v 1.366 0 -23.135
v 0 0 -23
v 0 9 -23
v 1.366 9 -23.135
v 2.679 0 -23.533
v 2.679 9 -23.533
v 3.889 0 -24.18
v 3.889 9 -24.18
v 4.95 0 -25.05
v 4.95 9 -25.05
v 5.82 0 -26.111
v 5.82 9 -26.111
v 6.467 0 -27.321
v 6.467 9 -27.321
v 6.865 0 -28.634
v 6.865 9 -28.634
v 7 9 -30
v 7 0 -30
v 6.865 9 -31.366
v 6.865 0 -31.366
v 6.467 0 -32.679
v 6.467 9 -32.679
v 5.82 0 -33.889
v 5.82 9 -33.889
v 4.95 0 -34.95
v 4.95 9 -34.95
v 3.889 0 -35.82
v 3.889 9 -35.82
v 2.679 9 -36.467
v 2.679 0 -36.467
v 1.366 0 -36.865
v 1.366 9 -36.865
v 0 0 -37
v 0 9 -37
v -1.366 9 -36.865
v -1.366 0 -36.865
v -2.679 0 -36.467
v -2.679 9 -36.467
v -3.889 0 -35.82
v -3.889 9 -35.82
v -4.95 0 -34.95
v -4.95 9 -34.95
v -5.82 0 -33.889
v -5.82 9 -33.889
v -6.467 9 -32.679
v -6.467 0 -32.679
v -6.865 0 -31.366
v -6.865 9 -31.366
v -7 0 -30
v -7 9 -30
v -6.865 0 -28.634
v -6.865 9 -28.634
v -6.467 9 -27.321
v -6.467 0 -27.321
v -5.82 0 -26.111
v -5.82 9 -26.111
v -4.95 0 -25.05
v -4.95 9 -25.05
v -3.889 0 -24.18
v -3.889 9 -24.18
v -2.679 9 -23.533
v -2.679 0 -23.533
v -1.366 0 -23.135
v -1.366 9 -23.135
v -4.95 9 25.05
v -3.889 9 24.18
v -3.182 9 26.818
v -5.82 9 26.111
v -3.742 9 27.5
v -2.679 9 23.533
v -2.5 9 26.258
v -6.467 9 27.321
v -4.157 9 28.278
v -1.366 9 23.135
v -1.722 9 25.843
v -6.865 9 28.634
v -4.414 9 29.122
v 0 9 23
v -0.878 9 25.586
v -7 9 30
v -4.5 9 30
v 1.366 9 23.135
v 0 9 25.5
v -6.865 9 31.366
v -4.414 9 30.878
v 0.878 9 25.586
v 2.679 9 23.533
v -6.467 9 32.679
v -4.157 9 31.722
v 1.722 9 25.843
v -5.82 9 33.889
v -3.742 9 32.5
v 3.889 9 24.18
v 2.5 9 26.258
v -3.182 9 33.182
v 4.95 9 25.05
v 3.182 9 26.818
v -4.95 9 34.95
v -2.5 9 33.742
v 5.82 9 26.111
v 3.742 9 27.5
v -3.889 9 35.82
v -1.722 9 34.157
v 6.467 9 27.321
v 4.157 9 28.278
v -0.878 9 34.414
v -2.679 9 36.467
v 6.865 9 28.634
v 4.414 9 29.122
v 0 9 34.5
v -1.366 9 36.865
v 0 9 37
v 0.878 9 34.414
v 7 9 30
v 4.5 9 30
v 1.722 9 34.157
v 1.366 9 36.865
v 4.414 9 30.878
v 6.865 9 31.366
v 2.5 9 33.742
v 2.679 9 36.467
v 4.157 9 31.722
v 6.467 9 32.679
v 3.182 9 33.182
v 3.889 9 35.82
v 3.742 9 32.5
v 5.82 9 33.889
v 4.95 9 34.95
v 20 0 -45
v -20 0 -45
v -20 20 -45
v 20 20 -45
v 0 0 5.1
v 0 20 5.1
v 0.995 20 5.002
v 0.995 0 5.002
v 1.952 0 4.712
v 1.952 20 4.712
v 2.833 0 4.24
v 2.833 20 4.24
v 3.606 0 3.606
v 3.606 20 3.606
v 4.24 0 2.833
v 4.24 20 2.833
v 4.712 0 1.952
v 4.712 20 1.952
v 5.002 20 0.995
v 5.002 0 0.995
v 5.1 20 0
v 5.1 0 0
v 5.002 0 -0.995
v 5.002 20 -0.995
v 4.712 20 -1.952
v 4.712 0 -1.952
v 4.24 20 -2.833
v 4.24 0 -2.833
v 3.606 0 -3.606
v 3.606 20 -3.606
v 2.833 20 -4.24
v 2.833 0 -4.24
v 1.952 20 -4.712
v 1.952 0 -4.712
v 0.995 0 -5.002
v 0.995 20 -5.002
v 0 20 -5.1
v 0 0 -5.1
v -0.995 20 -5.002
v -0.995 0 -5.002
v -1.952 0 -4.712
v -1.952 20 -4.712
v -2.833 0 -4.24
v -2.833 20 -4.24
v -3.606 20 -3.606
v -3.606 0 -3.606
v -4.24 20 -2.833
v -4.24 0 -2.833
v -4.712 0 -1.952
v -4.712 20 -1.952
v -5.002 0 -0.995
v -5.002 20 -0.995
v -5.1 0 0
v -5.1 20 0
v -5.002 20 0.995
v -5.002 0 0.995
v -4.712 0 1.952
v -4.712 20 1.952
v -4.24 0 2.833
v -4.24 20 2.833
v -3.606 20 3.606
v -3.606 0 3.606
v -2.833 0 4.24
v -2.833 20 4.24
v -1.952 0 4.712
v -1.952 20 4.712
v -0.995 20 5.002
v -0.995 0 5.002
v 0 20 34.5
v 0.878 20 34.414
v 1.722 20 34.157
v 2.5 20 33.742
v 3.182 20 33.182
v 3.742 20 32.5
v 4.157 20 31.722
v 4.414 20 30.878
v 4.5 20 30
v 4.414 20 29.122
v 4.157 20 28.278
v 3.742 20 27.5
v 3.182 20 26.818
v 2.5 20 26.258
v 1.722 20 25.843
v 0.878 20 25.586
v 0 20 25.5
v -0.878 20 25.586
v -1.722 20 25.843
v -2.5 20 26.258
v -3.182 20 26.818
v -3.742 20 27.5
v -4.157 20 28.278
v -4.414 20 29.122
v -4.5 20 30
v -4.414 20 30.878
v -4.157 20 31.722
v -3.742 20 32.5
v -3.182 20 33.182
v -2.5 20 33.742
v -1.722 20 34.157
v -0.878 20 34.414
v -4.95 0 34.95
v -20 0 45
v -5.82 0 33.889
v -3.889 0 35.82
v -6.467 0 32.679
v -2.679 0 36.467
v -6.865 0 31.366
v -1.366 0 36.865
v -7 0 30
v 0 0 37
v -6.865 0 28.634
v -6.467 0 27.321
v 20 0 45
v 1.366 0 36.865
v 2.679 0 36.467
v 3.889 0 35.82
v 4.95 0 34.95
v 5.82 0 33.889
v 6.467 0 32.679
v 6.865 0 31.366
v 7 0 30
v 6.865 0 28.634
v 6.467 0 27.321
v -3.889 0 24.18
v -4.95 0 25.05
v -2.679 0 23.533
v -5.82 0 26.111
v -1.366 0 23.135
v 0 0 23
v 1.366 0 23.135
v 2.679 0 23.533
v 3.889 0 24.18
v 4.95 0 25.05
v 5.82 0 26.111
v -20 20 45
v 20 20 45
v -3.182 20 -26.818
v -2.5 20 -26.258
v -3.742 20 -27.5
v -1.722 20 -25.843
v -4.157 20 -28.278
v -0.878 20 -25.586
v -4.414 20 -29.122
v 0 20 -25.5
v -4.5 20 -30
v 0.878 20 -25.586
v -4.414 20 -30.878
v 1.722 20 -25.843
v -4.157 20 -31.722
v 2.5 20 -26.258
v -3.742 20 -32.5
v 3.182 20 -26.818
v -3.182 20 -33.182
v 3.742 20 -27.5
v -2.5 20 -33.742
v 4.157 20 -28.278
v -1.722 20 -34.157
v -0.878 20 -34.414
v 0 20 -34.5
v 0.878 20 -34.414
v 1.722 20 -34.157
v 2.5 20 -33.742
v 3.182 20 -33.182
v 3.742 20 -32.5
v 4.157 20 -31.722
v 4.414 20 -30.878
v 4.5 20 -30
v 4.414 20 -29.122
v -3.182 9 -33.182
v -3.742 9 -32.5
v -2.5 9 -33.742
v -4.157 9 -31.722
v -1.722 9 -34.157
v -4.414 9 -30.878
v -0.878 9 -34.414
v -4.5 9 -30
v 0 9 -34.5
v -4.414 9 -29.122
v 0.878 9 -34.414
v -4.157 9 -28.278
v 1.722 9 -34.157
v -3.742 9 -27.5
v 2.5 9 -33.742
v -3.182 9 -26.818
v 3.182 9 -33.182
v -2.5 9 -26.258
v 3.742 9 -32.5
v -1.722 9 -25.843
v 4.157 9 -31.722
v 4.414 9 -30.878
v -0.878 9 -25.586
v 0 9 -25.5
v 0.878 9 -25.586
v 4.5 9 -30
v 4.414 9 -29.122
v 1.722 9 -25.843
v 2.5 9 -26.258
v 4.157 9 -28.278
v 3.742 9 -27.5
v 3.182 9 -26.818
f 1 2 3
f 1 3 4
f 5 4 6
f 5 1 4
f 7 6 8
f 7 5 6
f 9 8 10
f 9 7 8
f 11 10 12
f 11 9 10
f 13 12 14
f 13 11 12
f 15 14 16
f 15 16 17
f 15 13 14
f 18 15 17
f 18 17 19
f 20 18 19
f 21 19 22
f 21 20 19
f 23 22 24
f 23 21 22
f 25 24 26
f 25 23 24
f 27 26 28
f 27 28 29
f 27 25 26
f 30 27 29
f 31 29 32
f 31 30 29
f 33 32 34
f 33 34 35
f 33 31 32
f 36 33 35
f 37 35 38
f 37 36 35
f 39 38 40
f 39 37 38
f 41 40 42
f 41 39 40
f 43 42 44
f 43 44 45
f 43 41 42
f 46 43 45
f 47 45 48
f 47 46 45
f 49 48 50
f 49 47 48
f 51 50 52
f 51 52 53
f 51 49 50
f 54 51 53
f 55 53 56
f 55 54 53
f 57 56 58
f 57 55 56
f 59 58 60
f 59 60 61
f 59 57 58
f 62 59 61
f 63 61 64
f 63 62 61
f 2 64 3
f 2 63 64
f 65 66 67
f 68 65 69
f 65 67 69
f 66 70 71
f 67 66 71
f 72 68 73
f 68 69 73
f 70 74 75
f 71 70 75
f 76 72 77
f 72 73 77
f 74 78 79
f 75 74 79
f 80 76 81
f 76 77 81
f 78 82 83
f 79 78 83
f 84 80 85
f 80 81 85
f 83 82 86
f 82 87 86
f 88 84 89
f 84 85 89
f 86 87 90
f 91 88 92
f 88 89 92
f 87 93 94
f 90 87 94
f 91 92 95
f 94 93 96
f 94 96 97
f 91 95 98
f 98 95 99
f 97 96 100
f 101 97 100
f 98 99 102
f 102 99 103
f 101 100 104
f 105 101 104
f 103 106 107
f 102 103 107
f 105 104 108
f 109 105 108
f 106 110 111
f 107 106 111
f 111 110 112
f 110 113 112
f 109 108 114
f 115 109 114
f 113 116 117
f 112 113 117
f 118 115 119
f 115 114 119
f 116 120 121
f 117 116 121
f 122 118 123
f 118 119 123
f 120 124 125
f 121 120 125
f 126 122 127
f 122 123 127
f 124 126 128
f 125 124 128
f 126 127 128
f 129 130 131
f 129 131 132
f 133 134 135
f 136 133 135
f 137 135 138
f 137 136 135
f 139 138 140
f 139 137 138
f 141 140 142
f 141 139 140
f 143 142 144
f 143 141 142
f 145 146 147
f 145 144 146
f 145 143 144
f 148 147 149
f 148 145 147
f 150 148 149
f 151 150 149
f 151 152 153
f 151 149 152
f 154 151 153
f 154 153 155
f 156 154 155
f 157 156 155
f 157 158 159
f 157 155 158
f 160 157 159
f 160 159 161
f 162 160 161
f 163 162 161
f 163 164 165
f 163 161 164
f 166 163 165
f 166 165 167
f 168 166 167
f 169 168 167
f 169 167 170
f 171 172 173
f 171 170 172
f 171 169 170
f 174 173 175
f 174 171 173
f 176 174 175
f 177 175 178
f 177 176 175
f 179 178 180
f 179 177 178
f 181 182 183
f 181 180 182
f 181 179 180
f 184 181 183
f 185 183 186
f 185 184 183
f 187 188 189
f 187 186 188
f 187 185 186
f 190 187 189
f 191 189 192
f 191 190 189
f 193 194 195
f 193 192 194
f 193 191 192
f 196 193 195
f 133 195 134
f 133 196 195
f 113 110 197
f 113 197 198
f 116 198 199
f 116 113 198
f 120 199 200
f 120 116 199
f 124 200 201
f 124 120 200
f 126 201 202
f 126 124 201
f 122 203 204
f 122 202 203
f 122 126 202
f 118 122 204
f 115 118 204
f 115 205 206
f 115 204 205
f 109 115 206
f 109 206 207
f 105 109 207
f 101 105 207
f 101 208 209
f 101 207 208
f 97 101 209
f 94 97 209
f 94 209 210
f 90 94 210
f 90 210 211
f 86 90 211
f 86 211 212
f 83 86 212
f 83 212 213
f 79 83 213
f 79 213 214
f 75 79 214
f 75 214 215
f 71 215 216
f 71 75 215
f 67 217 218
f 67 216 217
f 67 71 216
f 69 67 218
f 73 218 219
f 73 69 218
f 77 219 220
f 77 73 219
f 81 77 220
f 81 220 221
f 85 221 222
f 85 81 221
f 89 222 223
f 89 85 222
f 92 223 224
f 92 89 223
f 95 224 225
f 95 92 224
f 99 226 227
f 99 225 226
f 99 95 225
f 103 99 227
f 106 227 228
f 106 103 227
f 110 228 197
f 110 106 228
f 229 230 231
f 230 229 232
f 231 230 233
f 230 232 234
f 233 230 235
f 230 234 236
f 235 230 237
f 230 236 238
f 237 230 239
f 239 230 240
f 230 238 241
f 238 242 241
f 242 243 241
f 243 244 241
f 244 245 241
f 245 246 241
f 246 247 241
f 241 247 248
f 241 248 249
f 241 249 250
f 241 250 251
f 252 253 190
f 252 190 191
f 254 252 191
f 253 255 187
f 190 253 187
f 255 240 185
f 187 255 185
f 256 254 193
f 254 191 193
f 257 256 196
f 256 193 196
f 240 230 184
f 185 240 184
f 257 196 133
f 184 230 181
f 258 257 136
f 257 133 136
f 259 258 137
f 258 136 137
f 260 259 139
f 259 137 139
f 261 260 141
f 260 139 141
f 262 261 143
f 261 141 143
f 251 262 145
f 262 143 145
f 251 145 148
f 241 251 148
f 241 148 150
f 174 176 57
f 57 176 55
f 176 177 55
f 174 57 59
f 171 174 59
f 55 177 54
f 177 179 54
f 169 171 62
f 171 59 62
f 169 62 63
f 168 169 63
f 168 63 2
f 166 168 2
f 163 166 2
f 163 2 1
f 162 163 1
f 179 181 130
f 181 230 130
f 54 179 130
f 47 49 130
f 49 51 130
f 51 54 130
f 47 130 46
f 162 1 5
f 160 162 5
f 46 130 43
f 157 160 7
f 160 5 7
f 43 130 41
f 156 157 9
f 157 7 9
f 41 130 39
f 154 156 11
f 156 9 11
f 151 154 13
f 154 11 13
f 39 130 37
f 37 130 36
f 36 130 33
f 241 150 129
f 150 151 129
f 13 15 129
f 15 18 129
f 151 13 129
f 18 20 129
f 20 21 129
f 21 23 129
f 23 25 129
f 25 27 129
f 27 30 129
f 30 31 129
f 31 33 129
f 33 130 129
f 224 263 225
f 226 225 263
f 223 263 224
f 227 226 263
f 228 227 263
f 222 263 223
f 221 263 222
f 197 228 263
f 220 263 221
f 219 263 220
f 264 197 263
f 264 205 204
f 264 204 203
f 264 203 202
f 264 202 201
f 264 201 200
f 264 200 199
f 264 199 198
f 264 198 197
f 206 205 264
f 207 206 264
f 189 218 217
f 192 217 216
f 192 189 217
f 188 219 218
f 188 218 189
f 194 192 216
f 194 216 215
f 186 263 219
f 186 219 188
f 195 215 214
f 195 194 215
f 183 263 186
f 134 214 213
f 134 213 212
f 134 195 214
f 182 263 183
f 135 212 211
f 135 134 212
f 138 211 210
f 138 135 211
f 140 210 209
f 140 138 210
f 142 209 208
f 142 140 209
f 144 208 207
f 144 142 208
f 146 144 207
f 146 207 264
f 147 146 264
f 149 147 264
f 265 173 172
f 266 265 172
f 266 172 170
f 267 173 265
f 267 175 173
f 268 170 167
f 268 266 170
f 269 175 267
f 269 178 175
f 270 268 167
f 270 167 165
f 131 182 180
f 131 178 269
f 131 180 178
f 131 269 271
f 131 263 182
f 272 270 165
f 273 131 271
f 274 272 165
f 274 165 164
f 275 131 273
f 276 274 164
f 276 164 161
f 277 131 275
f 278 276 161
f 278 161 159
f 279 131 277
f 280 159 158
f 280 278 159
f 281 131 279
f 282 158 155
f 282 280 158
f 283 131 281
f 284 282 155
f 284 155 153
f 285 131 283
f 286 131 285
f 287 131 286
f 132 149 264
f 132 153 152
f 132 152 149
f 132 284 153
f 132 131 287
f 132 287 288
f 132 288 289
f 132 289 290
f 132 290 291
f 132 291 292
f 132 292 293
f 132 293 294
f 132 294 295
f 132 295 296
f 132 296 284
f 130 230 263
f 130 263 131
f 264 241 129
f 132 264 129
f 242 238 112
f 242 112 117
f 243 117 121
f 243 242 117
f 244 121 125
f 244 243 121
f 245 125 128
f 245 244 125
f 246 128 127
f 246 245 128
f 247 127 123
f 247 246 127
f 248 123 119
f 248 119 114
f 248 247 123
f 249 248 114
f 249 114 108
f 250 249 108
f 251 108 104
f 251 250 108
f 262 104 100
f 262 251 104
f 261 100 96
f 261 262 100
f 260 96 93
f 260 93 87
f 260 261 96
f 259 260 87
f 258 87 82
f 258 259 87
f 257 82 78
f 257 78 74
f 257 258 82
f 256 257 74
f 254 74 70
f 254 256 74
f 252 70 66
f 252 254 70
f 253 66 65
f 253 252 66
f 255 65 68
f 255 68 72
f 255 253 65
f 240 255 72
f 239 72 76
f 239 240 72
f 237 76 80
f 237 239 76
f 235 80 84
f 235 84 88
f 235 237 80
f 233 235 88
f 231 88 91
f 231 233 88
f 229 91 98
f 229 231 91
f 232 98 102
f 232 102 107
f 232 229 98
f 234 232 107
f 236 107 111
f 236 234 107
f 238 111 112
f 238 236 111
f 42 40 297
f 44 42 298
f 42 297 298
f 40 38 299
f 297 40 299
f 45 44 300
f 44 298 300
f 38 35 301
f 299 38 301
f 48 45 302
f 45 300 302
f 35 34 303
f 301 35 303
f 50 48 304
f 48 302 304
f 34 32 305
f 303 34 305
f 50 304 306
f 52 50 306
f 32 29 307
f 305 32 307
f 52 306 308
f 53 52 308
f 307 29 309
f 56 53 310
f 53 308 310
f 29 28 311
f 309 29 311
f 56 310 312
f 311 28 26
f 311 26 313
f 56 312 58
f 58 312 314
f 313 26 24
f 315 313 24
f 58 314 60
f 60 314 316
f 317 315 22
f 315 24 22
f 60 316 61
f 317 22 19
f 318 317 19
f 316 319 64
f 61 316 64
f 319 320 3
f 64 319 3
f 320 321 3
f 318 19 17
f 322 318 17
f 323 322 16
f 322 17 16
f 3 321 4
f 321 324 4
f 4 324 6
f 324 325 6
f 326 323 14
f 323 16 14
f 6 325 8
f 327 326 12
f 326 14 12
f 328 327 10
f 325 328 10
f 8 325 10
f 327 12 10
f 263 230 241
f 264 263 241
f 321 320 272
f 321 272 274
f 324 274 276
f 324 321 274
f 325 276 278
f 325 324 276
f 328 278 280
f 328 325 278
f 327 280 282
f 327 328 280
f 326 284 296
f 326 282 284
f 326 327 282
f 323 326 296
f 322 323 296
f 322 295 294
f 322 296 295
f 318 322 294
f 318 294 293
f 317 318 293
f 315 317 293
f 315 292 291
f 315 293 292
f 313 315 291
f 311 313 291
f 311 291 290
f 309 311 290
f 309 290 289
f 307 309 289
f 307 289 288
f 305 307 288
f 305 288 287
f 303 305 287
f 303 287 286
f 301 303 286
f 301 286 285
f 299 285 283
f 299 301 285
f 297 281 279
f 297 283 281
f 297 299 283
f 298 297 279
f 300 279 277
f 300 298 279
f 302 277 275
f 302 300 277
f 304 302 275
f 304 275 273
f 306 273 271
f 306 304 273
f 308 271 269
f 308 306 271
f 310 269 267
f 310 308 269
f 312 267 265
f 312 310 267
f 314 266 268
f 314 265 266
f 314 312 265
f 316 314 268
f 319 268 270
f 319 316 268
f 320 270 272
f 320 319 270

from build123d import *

# Parameters (mm, degrees)
SKETCH1_W               = 40
SKETCH1_H               = 90
BOSS_EXTRUDE1_DEPTH     = 20
CUT_EXTRUDE1_DEPTH      = 54.150729064
CUT_EXTRUDE1_DEPTH_BACK = 54.150729064
SKETCH2_R               = 5.1
CUT_EXTRUDE2_DEPTH      = 54.150729064
CUT_EXTRUDE2_DEPTH_BACK = 54.150729064
SKETCH3_R               = 4.5
SKETCH4_R               = 7
CUT_EXTRUDE4_DEPTH      = 9


with BuildPart() as part:
    # Sketch1 → Boss-Extrude1 (new body)
    with BuildSketch(Plane(origin=(0, 0, 0), x_dir=(1, 0, 0), z_dir=(0, 1, 0))):
        Rectangle(SKETCH1_W, SKETCH1_H)
    extrude(amount=BOSS_EXTRUDE1_DEPTH)

    # Sketch2 → Cut-Extrude1 (cut, two sides: drawn at the far end of the back side and taken through both)
    with BuildSketch(Plane(origin=(0, 0, 0), x_dir=(1, 0, 0), z_dir=(0, 1, 0)).offset(-CUT_EXTRUDE1_DEPTH_BACK)):
        with Locations(Location((0, 0, 0), (0, 0, 270))):
            Circle(SKETCH2_R)
    extrude(amount=CUT_EXTRUDE1_DEPTH + CUT_EXTRUDE1_DEPTH_BACK, mode=Mode.SUBTRACT)

    # Sketch3 → Cut-Extrude2 (cut, two sides: drawn at the far end of the back side and taken through both)
    with BuildSketch(Plane(origin=(0, 0, 0), x_dir=(1, 0, 0), z_dir=(0, 1, 0)).offset(-CUT_EXTRUDE2_DEPTH_BACK)):
        with Locations(Location((0, -30, 0), (0, 0, 270))):
            Circle(SKETCH3_R)
        with Locations(Location((0, 30, 0), (0, 0, 270))):
            Circle(SKETCH3_R)
    extrude(amount=CUT_EXTRUDE2_DEPTH + CUT_EXTRUDE2_DEPTH_BACK, mode=Mode.SUBTRACT)

    # Sketch4 → Cut-Extrude4 (cut)
    with BuildSketch(Plane(origin=(0, 0, 0), x_dir=(1, 0, 0), z_dir=(0, 1, 0))):
        with Locations(Location((0, -30, 0), (0, 0, 270))):
            Circle(SKETCH4_R)
        with Locations(Location((0, 30, 0), (0, 0, 270))):
            Circle(SKETCH4_R)
    extrude(amount=CUT_EXTRUDE4_DEPTH, mode=Mode.SUBTRACT)


solid = part.part
